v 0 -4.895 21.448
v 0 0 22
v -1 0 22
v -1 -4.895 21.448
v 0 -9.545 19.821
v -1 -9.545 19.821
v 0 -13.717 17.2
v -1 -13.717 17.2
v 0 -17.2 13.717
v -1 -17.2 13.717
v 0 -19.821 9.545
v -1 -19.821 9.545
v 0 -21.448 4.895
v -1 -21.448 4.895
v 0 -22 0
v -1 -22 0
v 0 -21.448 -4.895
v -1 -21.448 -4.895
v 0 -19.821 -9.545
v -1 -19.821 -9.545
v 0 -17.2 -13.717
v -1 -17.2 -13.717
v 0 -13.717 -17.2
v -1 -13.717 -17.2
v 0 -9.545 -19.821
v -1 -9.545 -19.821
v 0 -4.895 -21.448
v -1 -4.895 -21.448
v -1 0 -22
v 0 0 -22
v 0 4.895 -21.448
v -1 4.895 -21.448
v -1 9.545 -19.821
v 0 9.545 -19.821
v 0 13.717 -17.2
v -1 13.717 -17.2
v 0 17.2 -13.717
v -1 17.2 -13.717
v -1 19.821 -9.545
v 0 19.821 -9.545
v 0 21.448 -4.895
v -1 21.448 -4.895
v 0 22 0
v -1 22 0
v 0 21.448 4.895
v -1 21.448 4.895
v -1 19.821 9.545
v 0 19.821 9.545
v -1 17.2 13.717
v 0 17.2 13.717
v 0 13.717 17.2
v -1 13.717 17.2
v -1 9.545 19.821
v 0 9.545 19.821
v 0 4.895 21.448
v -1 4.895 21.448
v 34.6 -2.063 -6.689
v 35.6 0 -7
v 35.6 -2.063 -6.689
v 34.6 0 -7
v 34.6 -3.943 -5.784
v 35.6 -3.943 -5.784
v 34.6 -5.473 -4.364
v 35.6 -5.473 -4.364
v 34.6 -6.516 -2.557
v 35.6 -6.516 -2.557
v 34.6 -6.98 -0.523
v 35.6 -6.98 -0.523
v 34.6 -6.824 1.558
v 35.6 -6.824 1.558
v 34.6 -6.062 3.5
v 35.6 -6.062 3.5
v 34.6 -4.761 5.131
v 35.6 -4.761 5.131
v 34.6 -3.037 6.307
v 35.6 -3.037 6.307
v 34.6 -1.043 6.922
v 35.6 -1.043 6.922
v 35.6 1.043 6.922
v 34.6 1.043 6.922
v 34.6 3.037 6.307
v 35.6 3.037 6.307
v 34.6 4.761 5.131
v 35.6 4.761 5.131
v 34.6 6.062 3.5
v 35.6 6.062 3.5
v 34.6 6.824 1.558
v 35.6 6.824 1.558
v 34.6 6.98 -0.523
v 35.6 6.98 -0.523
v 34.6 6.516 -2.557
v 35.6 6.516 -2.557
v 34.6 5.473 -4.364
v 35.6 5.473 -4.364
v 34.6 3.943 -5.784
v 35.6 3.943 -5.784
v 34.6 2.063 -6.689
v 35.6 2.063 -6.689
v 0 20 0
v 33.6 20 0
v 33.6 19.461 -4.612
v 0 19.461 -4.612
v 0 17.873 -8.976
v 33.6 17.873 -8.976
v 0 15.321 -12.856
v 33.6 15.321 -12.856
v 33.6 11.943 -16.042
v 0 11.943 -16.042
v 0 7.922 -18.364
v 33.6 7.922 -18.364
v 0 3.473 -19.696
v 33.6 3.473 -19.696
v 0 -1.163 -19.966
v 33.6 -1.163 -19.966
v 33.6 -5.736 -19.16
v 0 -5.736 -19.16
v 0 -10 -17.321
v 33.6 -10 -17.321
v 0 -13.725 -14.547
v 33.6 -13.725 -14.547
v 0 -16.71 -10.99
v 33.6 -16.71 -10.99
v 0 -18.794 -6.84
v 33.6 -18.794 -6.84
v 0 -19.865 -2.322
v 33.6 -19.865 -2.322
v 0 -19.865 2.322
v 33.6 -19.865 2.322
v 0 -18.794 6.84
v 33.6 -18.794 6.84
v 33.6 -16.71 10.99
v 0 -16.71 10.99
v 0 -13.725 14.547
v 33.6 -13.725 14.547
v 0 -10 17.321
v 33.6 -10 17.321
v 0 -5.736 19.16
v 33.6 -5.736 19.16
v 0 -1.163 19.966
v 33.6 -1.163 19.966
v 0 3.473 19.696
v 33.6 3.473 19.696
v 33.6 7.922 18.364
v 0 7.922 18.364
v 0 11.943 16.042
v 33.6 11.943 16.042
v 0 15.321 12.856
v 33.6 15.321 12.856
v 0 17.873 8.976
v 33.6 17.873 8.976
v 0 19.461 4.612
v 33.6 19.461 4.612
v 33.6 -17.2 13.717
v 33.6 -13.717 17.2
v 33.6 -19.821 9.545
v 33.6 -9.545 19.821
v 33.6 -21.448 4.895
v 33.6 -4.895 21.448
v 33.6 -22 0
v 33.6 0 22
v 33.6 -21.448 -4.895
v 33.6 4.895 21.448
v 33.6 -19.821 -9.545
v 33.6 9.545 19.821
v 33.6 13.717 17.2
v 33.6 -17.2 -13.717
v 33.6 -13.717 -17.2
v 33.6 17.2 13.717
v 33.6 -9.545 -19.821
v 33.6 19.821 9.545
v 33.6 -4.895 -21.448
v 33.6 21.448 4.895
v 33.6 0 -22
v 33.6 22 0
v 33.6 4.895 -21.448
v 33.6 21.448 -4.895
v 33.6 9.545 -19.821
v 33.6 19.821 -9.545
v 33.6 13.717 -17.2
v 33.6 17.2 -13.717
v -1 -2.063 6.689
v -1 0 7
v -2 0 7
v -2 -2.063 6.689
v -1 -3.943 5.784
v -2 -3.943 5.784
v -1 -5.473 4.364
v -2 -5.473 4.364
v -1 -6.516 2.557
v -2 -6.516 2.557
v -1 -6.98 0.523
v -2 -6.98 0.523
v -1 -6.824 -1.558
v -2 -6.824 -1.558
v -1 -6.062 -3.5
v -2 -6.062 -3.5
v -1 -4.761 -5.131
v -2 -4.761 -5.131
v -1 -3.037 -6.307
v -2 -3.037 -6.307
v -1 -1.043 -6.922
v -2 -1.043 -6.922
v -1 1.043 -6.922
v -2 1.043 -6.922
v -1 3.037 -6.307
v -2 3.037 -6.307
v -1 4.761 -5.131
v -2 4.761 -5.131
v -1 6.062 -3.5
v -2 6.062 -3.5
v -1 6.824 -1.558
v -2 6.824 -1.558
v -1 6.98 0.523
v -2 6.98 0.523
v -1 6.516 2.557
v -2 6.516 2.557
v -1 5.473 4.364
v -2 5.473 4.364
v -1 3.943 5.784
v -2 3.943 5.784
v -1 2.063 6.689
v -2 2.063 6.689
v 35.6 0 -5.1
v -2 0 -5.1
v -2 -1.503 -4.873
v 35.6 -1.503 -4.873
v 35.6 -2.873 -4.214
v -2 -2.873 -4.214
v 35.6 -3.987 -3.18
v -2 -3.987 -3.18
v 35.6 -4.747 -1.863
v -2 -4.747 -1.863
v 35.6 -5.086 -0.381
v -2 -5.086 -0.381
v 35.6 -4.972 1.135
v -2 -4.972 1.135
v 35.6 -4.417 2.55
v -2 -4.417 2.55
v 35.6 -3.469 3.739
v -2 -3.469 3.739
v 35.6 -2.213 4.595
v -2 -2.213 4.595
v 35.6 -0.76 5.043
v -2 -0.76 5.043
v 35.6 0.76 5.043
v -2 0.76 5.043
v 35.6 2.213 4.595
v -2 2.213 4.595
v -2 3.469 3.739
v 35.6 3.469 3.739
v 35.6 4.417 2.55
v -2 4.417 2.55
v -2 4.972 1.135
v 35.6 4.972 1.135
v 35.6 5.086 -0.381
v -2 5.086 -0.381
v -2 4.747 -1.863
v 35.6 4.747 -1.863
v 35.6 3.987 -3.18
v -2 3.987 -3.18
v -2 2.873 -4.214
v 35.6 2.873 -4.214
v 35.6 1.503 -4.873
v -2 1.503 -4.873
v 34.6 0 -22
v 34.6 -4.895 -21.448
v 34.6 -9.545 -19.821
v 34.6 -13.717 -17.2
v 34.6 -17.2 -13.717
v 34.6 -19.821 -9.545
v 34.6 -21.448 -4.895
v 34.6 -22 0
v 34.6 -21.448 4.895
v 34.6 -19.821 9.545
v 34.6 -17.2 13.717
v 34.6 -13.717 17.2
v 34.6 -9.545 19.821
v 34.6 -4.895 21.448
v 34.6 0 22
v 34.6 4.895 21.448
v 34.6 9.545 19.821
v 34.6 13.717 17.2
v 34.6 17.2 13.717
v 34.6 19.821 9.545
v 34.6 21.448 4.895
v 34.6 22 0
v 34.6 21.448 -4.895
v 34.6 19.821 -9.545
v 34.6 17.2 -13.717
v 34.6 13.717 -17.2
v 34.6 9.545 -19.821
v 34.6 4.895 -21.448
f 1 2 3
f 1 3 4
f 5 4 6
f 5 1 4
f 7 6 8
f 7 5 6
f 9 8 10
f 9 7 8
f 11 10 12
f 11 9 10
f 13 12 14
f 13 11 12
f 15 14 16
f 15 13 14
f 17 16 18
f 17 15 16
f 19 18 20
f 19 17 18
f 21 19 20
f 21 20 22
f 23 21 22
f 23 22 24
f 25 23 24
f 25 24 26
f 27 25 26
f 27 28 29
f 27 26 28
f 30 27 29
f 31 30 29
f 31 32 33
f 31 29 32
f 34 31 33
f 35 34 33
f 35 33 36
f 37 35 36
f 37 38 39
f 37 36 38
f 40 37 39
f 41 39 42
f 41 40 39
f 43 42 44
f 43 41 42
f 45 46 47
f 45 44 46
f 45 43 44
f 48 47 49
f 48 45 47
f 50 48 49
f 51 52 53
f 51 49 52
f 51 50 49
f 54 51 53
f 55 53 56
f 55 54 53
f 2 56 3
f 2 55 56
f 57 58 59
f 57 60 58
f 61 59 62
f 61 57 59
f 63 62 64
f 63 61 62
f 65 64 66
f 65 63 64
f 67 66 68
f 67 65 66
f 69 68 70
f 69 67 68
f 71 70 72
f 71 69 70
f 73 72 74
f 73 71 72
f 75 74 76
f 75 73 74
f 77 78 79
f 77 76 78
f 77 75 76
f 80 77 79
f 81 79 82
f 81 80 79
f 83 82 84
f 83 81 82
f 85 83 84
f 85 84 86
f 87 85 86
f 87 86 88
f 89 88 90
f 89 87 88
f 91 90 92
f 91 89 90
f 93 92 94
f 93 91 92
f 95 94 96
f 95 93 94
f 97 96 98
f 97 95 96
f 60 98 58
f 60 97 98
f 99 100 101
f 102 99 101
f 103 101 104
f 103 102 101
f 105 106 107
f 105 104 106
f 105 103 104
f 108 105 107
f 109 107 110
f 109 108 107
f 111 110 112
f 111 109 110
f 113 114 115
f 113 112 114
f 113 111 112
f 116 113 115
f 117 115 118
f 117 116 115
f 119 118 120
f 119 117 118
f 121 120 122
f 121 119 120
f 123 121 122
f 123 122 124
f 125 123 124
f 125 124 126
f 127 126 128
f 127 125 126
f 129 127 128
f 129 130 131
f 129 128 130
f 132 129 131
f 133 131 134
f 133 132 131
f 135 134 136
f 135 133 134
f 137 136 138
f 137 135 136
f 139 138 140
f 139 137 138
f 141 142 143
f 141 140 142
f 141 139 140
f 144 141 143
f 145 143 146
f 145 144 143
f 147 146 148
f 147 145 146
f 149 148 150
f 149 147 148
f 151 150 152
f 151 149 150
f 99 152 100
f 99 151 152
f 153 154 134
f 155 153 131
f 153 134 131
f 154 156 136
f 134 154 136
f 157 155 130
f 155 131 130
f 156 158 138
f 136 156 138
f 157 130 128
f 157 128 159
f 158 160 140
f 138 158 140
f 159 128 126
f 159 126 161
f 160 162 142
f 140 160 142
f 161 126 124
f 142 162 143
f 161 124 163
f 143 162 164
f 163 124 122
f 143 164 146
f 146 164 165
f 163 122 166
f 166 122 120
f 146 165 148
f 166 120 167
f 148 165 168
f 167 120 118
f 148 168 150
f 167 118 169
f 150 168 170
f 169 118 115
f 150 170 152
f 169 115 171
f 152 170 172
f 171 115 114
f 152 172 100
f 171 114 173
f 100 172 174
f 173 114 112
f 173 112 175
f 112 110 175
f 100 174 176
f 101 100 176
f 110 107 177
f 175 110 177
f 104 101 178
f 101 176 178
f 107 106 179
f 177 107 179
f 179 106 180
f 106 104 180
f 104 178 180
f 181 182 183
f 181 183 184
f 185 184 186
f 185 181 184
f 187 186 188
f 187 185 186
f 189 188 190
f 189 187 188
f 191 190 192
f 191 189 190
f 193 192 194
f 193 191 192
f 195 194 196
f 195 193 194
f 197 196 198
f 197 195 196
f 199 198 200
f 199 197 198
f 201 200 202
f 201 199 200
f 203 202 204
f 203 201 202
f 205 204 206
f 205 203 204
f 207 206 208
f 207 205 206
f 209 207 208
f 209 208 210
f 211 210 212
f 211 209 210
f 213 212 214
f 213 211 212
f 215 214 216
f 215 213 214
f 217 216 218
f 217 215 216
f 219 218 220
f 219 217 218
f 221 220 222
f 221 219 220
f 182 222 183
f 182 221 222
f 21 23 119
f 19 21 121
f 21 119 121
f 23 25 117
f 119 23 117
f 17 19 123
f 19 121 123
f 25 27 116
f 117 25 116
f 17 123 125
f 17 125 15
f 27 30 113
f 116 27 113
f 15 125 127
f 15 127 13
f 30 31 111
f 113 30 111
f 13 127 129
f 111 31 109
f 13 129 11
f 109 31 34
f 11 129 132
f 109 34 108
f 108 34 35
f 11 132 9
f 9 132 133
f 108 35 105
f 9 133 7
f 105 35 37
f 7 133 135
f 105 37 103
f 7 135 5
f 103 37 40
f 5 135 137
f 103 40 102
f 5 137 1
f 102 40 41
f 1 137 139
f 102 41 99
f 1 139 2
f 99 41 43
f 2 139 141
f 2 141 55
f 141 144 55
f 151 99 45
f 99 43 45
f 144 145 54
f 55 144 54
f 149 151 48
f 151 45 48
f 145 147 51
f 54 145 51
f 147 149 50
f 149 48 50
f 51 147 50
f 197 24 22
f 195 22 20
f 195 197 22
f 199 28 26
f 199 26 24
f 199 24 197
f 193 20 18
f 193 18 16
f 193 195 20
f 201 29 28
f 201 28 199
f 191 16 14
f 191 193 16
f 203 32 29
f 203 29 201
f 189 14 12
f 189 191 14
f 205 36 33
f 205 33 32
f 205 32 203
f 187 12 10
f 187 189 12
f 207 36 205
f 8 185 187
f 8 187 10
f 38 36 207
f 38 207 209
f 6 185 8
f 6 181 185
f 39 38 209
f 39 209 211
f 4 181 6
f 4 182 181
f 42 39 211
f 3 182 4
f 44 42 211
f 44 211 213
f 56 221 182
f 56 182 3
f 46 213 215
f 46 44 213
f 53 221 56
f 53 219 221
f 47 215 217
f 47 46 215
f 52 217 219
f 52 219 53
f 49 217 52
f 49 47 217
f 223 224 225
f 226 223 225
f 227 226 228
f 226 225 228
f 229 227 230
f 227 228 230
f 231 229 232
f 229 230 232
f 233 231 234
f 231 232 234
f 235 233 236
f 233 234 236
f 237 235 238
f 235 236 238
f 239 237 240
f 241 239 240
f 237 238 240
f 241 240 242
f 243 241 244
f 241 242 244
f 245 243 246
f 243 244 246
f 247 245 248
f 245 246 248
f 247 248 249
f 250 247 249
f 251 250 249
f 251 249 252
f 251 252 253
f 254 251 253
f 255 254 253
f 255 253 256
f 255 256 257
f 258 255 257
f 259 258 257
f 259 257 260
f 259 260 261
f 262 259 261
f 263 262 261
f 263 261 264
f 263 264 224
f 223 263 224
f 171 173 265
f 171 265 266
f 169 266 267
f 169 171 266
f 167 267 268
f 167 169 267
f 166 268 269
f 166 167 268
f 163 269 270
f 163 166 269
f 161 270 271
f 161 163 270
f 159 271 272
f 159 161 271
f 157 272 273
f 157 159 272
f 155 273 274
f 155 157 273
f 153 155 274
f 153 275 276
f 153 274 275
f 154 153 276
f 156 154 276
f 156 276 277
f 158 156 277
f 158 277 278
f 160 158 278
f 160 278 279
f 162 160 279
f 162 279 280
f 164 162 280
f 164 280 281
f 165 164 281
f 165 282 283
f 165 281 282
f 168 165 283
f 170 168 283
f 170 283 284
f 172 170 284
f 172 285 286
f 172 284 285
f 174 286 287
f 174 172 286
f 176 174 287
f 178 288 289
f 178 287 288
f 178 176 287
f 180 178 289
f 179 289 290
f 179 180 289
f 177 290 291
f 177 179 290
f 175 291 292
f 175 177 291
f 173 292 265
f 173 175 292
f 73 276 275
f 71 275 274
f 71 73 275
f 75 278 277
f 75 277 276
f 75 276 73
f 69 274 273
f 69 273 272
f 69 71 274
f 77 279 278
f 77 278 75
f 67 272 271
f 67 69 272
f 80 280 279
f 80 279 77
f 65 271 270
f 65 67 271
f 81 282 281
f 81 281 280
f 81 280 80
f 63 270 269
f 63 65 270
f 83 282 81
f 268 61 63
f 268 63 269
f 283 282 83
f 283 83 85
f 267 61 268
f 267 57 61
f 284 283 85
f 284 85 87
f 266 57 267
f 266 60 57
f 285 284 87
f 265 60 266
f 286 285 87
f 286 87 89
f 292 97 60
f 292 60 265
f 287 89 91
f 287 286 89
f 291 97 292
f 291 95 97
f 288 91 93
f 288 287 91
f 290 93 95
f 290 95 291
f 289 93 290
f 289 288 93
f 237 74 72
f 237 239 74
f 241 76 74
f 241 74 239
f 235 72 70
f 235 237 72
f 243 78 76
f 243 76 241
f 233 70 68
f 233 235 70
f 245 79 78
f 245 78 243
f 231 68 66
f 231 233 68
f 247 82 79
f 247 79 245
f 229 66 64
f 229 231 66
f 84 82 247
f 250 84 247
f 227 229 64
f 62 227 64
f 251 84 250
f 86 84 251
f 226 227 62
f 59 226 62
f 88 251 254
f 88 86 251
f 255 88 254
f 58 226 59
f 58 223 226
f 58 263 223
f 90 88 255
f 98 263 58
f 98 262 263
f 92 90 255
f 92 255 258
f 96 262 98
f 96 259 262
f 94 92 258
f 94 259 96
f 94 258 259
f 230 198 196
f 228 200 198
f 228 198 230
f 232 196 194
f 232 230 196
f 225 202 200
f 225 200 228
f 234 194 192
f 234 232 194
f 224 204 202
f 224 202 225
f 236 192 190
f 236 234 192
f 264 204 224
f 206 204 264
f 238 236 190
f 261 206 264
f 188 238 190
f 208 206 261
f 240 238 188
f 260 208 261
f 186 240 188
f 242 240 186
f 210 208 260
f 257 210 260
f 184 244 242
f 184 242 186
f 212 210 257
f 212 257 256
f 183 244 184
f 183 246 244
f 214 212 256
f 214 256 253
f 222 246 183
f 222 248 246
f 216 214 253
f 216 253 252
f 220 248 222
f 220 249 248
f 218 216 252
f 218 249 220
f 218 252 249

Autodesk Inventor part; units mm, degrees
ref_plane "YZ Plane" through (0, 0, 0) normal (1, 0, 0) x (0, 1, 0)
ref_plane "XZ Plane" through (0, 0, 0) normal (0, 1, 0) x (-1, 0, 0)
ref_plane "XY Plane" through (0, 0, 0) normal (0, 0, 1) x (1, 0, 0)
sketch "スケッチ1" plane through (0, 0, 0) normal (1, 0, 0) x (0, 1, 0)
  circle A0 centre (0, 0) radius 20
  dimension "d0" = 40
extrude "押し出し1" add sketch "スケッチ1" along normal blind 33.6
sketch "スケッチ2" plane through (33.6, 0, 0) normal (1, 0, 0) x (0, 0, -1)
  circle A0 centre (0, 0) radius 22
  dimension "d3" = 44
extrude "押し出し2" add sketch "スケッチ2" along normal blind 1
sketch "スケッチ3" plane through (34.6, 0, 0) normal (1, 0, 0) x (0, 0, -1)
  circle A0 centre (0, 0) radius 7
  dimension "d6" = 14
extrude "押し出し3" add sketch "スケッチ3" along normal blind 1
sketch "スケッチ4" plane through (0, 0, 0) normal (-1, 0, 0) x (0, 0, 1)
  circle A0 centre (0, 0) radius 22
  dimension "d9" = 44
extrude "押し出し4" add sketch "スケッチ4" along normal blind 1
sketch "スケッチ5" plane through (-1, 0, 0) normal (-1, 0, 0) x (0, 0, 1)
  circle A0 centre (0, 0) radius 7
  dimension "d12" = 14
extrude "押し出し5" add sketch "スケッチ5" along normal blind 1
sketch "スケッチ6" plane through (35.6, 0, 0) normal (1, 0, 0) x (0, 0, -1)
  circle A0 centre (0, 0) radius 7 projected
hole "穴1" at (35.6, 0, 0) direction (-1, 0, 0) diameter 10.2 end through all
properties part number "CLS_typeC_31.4N"
